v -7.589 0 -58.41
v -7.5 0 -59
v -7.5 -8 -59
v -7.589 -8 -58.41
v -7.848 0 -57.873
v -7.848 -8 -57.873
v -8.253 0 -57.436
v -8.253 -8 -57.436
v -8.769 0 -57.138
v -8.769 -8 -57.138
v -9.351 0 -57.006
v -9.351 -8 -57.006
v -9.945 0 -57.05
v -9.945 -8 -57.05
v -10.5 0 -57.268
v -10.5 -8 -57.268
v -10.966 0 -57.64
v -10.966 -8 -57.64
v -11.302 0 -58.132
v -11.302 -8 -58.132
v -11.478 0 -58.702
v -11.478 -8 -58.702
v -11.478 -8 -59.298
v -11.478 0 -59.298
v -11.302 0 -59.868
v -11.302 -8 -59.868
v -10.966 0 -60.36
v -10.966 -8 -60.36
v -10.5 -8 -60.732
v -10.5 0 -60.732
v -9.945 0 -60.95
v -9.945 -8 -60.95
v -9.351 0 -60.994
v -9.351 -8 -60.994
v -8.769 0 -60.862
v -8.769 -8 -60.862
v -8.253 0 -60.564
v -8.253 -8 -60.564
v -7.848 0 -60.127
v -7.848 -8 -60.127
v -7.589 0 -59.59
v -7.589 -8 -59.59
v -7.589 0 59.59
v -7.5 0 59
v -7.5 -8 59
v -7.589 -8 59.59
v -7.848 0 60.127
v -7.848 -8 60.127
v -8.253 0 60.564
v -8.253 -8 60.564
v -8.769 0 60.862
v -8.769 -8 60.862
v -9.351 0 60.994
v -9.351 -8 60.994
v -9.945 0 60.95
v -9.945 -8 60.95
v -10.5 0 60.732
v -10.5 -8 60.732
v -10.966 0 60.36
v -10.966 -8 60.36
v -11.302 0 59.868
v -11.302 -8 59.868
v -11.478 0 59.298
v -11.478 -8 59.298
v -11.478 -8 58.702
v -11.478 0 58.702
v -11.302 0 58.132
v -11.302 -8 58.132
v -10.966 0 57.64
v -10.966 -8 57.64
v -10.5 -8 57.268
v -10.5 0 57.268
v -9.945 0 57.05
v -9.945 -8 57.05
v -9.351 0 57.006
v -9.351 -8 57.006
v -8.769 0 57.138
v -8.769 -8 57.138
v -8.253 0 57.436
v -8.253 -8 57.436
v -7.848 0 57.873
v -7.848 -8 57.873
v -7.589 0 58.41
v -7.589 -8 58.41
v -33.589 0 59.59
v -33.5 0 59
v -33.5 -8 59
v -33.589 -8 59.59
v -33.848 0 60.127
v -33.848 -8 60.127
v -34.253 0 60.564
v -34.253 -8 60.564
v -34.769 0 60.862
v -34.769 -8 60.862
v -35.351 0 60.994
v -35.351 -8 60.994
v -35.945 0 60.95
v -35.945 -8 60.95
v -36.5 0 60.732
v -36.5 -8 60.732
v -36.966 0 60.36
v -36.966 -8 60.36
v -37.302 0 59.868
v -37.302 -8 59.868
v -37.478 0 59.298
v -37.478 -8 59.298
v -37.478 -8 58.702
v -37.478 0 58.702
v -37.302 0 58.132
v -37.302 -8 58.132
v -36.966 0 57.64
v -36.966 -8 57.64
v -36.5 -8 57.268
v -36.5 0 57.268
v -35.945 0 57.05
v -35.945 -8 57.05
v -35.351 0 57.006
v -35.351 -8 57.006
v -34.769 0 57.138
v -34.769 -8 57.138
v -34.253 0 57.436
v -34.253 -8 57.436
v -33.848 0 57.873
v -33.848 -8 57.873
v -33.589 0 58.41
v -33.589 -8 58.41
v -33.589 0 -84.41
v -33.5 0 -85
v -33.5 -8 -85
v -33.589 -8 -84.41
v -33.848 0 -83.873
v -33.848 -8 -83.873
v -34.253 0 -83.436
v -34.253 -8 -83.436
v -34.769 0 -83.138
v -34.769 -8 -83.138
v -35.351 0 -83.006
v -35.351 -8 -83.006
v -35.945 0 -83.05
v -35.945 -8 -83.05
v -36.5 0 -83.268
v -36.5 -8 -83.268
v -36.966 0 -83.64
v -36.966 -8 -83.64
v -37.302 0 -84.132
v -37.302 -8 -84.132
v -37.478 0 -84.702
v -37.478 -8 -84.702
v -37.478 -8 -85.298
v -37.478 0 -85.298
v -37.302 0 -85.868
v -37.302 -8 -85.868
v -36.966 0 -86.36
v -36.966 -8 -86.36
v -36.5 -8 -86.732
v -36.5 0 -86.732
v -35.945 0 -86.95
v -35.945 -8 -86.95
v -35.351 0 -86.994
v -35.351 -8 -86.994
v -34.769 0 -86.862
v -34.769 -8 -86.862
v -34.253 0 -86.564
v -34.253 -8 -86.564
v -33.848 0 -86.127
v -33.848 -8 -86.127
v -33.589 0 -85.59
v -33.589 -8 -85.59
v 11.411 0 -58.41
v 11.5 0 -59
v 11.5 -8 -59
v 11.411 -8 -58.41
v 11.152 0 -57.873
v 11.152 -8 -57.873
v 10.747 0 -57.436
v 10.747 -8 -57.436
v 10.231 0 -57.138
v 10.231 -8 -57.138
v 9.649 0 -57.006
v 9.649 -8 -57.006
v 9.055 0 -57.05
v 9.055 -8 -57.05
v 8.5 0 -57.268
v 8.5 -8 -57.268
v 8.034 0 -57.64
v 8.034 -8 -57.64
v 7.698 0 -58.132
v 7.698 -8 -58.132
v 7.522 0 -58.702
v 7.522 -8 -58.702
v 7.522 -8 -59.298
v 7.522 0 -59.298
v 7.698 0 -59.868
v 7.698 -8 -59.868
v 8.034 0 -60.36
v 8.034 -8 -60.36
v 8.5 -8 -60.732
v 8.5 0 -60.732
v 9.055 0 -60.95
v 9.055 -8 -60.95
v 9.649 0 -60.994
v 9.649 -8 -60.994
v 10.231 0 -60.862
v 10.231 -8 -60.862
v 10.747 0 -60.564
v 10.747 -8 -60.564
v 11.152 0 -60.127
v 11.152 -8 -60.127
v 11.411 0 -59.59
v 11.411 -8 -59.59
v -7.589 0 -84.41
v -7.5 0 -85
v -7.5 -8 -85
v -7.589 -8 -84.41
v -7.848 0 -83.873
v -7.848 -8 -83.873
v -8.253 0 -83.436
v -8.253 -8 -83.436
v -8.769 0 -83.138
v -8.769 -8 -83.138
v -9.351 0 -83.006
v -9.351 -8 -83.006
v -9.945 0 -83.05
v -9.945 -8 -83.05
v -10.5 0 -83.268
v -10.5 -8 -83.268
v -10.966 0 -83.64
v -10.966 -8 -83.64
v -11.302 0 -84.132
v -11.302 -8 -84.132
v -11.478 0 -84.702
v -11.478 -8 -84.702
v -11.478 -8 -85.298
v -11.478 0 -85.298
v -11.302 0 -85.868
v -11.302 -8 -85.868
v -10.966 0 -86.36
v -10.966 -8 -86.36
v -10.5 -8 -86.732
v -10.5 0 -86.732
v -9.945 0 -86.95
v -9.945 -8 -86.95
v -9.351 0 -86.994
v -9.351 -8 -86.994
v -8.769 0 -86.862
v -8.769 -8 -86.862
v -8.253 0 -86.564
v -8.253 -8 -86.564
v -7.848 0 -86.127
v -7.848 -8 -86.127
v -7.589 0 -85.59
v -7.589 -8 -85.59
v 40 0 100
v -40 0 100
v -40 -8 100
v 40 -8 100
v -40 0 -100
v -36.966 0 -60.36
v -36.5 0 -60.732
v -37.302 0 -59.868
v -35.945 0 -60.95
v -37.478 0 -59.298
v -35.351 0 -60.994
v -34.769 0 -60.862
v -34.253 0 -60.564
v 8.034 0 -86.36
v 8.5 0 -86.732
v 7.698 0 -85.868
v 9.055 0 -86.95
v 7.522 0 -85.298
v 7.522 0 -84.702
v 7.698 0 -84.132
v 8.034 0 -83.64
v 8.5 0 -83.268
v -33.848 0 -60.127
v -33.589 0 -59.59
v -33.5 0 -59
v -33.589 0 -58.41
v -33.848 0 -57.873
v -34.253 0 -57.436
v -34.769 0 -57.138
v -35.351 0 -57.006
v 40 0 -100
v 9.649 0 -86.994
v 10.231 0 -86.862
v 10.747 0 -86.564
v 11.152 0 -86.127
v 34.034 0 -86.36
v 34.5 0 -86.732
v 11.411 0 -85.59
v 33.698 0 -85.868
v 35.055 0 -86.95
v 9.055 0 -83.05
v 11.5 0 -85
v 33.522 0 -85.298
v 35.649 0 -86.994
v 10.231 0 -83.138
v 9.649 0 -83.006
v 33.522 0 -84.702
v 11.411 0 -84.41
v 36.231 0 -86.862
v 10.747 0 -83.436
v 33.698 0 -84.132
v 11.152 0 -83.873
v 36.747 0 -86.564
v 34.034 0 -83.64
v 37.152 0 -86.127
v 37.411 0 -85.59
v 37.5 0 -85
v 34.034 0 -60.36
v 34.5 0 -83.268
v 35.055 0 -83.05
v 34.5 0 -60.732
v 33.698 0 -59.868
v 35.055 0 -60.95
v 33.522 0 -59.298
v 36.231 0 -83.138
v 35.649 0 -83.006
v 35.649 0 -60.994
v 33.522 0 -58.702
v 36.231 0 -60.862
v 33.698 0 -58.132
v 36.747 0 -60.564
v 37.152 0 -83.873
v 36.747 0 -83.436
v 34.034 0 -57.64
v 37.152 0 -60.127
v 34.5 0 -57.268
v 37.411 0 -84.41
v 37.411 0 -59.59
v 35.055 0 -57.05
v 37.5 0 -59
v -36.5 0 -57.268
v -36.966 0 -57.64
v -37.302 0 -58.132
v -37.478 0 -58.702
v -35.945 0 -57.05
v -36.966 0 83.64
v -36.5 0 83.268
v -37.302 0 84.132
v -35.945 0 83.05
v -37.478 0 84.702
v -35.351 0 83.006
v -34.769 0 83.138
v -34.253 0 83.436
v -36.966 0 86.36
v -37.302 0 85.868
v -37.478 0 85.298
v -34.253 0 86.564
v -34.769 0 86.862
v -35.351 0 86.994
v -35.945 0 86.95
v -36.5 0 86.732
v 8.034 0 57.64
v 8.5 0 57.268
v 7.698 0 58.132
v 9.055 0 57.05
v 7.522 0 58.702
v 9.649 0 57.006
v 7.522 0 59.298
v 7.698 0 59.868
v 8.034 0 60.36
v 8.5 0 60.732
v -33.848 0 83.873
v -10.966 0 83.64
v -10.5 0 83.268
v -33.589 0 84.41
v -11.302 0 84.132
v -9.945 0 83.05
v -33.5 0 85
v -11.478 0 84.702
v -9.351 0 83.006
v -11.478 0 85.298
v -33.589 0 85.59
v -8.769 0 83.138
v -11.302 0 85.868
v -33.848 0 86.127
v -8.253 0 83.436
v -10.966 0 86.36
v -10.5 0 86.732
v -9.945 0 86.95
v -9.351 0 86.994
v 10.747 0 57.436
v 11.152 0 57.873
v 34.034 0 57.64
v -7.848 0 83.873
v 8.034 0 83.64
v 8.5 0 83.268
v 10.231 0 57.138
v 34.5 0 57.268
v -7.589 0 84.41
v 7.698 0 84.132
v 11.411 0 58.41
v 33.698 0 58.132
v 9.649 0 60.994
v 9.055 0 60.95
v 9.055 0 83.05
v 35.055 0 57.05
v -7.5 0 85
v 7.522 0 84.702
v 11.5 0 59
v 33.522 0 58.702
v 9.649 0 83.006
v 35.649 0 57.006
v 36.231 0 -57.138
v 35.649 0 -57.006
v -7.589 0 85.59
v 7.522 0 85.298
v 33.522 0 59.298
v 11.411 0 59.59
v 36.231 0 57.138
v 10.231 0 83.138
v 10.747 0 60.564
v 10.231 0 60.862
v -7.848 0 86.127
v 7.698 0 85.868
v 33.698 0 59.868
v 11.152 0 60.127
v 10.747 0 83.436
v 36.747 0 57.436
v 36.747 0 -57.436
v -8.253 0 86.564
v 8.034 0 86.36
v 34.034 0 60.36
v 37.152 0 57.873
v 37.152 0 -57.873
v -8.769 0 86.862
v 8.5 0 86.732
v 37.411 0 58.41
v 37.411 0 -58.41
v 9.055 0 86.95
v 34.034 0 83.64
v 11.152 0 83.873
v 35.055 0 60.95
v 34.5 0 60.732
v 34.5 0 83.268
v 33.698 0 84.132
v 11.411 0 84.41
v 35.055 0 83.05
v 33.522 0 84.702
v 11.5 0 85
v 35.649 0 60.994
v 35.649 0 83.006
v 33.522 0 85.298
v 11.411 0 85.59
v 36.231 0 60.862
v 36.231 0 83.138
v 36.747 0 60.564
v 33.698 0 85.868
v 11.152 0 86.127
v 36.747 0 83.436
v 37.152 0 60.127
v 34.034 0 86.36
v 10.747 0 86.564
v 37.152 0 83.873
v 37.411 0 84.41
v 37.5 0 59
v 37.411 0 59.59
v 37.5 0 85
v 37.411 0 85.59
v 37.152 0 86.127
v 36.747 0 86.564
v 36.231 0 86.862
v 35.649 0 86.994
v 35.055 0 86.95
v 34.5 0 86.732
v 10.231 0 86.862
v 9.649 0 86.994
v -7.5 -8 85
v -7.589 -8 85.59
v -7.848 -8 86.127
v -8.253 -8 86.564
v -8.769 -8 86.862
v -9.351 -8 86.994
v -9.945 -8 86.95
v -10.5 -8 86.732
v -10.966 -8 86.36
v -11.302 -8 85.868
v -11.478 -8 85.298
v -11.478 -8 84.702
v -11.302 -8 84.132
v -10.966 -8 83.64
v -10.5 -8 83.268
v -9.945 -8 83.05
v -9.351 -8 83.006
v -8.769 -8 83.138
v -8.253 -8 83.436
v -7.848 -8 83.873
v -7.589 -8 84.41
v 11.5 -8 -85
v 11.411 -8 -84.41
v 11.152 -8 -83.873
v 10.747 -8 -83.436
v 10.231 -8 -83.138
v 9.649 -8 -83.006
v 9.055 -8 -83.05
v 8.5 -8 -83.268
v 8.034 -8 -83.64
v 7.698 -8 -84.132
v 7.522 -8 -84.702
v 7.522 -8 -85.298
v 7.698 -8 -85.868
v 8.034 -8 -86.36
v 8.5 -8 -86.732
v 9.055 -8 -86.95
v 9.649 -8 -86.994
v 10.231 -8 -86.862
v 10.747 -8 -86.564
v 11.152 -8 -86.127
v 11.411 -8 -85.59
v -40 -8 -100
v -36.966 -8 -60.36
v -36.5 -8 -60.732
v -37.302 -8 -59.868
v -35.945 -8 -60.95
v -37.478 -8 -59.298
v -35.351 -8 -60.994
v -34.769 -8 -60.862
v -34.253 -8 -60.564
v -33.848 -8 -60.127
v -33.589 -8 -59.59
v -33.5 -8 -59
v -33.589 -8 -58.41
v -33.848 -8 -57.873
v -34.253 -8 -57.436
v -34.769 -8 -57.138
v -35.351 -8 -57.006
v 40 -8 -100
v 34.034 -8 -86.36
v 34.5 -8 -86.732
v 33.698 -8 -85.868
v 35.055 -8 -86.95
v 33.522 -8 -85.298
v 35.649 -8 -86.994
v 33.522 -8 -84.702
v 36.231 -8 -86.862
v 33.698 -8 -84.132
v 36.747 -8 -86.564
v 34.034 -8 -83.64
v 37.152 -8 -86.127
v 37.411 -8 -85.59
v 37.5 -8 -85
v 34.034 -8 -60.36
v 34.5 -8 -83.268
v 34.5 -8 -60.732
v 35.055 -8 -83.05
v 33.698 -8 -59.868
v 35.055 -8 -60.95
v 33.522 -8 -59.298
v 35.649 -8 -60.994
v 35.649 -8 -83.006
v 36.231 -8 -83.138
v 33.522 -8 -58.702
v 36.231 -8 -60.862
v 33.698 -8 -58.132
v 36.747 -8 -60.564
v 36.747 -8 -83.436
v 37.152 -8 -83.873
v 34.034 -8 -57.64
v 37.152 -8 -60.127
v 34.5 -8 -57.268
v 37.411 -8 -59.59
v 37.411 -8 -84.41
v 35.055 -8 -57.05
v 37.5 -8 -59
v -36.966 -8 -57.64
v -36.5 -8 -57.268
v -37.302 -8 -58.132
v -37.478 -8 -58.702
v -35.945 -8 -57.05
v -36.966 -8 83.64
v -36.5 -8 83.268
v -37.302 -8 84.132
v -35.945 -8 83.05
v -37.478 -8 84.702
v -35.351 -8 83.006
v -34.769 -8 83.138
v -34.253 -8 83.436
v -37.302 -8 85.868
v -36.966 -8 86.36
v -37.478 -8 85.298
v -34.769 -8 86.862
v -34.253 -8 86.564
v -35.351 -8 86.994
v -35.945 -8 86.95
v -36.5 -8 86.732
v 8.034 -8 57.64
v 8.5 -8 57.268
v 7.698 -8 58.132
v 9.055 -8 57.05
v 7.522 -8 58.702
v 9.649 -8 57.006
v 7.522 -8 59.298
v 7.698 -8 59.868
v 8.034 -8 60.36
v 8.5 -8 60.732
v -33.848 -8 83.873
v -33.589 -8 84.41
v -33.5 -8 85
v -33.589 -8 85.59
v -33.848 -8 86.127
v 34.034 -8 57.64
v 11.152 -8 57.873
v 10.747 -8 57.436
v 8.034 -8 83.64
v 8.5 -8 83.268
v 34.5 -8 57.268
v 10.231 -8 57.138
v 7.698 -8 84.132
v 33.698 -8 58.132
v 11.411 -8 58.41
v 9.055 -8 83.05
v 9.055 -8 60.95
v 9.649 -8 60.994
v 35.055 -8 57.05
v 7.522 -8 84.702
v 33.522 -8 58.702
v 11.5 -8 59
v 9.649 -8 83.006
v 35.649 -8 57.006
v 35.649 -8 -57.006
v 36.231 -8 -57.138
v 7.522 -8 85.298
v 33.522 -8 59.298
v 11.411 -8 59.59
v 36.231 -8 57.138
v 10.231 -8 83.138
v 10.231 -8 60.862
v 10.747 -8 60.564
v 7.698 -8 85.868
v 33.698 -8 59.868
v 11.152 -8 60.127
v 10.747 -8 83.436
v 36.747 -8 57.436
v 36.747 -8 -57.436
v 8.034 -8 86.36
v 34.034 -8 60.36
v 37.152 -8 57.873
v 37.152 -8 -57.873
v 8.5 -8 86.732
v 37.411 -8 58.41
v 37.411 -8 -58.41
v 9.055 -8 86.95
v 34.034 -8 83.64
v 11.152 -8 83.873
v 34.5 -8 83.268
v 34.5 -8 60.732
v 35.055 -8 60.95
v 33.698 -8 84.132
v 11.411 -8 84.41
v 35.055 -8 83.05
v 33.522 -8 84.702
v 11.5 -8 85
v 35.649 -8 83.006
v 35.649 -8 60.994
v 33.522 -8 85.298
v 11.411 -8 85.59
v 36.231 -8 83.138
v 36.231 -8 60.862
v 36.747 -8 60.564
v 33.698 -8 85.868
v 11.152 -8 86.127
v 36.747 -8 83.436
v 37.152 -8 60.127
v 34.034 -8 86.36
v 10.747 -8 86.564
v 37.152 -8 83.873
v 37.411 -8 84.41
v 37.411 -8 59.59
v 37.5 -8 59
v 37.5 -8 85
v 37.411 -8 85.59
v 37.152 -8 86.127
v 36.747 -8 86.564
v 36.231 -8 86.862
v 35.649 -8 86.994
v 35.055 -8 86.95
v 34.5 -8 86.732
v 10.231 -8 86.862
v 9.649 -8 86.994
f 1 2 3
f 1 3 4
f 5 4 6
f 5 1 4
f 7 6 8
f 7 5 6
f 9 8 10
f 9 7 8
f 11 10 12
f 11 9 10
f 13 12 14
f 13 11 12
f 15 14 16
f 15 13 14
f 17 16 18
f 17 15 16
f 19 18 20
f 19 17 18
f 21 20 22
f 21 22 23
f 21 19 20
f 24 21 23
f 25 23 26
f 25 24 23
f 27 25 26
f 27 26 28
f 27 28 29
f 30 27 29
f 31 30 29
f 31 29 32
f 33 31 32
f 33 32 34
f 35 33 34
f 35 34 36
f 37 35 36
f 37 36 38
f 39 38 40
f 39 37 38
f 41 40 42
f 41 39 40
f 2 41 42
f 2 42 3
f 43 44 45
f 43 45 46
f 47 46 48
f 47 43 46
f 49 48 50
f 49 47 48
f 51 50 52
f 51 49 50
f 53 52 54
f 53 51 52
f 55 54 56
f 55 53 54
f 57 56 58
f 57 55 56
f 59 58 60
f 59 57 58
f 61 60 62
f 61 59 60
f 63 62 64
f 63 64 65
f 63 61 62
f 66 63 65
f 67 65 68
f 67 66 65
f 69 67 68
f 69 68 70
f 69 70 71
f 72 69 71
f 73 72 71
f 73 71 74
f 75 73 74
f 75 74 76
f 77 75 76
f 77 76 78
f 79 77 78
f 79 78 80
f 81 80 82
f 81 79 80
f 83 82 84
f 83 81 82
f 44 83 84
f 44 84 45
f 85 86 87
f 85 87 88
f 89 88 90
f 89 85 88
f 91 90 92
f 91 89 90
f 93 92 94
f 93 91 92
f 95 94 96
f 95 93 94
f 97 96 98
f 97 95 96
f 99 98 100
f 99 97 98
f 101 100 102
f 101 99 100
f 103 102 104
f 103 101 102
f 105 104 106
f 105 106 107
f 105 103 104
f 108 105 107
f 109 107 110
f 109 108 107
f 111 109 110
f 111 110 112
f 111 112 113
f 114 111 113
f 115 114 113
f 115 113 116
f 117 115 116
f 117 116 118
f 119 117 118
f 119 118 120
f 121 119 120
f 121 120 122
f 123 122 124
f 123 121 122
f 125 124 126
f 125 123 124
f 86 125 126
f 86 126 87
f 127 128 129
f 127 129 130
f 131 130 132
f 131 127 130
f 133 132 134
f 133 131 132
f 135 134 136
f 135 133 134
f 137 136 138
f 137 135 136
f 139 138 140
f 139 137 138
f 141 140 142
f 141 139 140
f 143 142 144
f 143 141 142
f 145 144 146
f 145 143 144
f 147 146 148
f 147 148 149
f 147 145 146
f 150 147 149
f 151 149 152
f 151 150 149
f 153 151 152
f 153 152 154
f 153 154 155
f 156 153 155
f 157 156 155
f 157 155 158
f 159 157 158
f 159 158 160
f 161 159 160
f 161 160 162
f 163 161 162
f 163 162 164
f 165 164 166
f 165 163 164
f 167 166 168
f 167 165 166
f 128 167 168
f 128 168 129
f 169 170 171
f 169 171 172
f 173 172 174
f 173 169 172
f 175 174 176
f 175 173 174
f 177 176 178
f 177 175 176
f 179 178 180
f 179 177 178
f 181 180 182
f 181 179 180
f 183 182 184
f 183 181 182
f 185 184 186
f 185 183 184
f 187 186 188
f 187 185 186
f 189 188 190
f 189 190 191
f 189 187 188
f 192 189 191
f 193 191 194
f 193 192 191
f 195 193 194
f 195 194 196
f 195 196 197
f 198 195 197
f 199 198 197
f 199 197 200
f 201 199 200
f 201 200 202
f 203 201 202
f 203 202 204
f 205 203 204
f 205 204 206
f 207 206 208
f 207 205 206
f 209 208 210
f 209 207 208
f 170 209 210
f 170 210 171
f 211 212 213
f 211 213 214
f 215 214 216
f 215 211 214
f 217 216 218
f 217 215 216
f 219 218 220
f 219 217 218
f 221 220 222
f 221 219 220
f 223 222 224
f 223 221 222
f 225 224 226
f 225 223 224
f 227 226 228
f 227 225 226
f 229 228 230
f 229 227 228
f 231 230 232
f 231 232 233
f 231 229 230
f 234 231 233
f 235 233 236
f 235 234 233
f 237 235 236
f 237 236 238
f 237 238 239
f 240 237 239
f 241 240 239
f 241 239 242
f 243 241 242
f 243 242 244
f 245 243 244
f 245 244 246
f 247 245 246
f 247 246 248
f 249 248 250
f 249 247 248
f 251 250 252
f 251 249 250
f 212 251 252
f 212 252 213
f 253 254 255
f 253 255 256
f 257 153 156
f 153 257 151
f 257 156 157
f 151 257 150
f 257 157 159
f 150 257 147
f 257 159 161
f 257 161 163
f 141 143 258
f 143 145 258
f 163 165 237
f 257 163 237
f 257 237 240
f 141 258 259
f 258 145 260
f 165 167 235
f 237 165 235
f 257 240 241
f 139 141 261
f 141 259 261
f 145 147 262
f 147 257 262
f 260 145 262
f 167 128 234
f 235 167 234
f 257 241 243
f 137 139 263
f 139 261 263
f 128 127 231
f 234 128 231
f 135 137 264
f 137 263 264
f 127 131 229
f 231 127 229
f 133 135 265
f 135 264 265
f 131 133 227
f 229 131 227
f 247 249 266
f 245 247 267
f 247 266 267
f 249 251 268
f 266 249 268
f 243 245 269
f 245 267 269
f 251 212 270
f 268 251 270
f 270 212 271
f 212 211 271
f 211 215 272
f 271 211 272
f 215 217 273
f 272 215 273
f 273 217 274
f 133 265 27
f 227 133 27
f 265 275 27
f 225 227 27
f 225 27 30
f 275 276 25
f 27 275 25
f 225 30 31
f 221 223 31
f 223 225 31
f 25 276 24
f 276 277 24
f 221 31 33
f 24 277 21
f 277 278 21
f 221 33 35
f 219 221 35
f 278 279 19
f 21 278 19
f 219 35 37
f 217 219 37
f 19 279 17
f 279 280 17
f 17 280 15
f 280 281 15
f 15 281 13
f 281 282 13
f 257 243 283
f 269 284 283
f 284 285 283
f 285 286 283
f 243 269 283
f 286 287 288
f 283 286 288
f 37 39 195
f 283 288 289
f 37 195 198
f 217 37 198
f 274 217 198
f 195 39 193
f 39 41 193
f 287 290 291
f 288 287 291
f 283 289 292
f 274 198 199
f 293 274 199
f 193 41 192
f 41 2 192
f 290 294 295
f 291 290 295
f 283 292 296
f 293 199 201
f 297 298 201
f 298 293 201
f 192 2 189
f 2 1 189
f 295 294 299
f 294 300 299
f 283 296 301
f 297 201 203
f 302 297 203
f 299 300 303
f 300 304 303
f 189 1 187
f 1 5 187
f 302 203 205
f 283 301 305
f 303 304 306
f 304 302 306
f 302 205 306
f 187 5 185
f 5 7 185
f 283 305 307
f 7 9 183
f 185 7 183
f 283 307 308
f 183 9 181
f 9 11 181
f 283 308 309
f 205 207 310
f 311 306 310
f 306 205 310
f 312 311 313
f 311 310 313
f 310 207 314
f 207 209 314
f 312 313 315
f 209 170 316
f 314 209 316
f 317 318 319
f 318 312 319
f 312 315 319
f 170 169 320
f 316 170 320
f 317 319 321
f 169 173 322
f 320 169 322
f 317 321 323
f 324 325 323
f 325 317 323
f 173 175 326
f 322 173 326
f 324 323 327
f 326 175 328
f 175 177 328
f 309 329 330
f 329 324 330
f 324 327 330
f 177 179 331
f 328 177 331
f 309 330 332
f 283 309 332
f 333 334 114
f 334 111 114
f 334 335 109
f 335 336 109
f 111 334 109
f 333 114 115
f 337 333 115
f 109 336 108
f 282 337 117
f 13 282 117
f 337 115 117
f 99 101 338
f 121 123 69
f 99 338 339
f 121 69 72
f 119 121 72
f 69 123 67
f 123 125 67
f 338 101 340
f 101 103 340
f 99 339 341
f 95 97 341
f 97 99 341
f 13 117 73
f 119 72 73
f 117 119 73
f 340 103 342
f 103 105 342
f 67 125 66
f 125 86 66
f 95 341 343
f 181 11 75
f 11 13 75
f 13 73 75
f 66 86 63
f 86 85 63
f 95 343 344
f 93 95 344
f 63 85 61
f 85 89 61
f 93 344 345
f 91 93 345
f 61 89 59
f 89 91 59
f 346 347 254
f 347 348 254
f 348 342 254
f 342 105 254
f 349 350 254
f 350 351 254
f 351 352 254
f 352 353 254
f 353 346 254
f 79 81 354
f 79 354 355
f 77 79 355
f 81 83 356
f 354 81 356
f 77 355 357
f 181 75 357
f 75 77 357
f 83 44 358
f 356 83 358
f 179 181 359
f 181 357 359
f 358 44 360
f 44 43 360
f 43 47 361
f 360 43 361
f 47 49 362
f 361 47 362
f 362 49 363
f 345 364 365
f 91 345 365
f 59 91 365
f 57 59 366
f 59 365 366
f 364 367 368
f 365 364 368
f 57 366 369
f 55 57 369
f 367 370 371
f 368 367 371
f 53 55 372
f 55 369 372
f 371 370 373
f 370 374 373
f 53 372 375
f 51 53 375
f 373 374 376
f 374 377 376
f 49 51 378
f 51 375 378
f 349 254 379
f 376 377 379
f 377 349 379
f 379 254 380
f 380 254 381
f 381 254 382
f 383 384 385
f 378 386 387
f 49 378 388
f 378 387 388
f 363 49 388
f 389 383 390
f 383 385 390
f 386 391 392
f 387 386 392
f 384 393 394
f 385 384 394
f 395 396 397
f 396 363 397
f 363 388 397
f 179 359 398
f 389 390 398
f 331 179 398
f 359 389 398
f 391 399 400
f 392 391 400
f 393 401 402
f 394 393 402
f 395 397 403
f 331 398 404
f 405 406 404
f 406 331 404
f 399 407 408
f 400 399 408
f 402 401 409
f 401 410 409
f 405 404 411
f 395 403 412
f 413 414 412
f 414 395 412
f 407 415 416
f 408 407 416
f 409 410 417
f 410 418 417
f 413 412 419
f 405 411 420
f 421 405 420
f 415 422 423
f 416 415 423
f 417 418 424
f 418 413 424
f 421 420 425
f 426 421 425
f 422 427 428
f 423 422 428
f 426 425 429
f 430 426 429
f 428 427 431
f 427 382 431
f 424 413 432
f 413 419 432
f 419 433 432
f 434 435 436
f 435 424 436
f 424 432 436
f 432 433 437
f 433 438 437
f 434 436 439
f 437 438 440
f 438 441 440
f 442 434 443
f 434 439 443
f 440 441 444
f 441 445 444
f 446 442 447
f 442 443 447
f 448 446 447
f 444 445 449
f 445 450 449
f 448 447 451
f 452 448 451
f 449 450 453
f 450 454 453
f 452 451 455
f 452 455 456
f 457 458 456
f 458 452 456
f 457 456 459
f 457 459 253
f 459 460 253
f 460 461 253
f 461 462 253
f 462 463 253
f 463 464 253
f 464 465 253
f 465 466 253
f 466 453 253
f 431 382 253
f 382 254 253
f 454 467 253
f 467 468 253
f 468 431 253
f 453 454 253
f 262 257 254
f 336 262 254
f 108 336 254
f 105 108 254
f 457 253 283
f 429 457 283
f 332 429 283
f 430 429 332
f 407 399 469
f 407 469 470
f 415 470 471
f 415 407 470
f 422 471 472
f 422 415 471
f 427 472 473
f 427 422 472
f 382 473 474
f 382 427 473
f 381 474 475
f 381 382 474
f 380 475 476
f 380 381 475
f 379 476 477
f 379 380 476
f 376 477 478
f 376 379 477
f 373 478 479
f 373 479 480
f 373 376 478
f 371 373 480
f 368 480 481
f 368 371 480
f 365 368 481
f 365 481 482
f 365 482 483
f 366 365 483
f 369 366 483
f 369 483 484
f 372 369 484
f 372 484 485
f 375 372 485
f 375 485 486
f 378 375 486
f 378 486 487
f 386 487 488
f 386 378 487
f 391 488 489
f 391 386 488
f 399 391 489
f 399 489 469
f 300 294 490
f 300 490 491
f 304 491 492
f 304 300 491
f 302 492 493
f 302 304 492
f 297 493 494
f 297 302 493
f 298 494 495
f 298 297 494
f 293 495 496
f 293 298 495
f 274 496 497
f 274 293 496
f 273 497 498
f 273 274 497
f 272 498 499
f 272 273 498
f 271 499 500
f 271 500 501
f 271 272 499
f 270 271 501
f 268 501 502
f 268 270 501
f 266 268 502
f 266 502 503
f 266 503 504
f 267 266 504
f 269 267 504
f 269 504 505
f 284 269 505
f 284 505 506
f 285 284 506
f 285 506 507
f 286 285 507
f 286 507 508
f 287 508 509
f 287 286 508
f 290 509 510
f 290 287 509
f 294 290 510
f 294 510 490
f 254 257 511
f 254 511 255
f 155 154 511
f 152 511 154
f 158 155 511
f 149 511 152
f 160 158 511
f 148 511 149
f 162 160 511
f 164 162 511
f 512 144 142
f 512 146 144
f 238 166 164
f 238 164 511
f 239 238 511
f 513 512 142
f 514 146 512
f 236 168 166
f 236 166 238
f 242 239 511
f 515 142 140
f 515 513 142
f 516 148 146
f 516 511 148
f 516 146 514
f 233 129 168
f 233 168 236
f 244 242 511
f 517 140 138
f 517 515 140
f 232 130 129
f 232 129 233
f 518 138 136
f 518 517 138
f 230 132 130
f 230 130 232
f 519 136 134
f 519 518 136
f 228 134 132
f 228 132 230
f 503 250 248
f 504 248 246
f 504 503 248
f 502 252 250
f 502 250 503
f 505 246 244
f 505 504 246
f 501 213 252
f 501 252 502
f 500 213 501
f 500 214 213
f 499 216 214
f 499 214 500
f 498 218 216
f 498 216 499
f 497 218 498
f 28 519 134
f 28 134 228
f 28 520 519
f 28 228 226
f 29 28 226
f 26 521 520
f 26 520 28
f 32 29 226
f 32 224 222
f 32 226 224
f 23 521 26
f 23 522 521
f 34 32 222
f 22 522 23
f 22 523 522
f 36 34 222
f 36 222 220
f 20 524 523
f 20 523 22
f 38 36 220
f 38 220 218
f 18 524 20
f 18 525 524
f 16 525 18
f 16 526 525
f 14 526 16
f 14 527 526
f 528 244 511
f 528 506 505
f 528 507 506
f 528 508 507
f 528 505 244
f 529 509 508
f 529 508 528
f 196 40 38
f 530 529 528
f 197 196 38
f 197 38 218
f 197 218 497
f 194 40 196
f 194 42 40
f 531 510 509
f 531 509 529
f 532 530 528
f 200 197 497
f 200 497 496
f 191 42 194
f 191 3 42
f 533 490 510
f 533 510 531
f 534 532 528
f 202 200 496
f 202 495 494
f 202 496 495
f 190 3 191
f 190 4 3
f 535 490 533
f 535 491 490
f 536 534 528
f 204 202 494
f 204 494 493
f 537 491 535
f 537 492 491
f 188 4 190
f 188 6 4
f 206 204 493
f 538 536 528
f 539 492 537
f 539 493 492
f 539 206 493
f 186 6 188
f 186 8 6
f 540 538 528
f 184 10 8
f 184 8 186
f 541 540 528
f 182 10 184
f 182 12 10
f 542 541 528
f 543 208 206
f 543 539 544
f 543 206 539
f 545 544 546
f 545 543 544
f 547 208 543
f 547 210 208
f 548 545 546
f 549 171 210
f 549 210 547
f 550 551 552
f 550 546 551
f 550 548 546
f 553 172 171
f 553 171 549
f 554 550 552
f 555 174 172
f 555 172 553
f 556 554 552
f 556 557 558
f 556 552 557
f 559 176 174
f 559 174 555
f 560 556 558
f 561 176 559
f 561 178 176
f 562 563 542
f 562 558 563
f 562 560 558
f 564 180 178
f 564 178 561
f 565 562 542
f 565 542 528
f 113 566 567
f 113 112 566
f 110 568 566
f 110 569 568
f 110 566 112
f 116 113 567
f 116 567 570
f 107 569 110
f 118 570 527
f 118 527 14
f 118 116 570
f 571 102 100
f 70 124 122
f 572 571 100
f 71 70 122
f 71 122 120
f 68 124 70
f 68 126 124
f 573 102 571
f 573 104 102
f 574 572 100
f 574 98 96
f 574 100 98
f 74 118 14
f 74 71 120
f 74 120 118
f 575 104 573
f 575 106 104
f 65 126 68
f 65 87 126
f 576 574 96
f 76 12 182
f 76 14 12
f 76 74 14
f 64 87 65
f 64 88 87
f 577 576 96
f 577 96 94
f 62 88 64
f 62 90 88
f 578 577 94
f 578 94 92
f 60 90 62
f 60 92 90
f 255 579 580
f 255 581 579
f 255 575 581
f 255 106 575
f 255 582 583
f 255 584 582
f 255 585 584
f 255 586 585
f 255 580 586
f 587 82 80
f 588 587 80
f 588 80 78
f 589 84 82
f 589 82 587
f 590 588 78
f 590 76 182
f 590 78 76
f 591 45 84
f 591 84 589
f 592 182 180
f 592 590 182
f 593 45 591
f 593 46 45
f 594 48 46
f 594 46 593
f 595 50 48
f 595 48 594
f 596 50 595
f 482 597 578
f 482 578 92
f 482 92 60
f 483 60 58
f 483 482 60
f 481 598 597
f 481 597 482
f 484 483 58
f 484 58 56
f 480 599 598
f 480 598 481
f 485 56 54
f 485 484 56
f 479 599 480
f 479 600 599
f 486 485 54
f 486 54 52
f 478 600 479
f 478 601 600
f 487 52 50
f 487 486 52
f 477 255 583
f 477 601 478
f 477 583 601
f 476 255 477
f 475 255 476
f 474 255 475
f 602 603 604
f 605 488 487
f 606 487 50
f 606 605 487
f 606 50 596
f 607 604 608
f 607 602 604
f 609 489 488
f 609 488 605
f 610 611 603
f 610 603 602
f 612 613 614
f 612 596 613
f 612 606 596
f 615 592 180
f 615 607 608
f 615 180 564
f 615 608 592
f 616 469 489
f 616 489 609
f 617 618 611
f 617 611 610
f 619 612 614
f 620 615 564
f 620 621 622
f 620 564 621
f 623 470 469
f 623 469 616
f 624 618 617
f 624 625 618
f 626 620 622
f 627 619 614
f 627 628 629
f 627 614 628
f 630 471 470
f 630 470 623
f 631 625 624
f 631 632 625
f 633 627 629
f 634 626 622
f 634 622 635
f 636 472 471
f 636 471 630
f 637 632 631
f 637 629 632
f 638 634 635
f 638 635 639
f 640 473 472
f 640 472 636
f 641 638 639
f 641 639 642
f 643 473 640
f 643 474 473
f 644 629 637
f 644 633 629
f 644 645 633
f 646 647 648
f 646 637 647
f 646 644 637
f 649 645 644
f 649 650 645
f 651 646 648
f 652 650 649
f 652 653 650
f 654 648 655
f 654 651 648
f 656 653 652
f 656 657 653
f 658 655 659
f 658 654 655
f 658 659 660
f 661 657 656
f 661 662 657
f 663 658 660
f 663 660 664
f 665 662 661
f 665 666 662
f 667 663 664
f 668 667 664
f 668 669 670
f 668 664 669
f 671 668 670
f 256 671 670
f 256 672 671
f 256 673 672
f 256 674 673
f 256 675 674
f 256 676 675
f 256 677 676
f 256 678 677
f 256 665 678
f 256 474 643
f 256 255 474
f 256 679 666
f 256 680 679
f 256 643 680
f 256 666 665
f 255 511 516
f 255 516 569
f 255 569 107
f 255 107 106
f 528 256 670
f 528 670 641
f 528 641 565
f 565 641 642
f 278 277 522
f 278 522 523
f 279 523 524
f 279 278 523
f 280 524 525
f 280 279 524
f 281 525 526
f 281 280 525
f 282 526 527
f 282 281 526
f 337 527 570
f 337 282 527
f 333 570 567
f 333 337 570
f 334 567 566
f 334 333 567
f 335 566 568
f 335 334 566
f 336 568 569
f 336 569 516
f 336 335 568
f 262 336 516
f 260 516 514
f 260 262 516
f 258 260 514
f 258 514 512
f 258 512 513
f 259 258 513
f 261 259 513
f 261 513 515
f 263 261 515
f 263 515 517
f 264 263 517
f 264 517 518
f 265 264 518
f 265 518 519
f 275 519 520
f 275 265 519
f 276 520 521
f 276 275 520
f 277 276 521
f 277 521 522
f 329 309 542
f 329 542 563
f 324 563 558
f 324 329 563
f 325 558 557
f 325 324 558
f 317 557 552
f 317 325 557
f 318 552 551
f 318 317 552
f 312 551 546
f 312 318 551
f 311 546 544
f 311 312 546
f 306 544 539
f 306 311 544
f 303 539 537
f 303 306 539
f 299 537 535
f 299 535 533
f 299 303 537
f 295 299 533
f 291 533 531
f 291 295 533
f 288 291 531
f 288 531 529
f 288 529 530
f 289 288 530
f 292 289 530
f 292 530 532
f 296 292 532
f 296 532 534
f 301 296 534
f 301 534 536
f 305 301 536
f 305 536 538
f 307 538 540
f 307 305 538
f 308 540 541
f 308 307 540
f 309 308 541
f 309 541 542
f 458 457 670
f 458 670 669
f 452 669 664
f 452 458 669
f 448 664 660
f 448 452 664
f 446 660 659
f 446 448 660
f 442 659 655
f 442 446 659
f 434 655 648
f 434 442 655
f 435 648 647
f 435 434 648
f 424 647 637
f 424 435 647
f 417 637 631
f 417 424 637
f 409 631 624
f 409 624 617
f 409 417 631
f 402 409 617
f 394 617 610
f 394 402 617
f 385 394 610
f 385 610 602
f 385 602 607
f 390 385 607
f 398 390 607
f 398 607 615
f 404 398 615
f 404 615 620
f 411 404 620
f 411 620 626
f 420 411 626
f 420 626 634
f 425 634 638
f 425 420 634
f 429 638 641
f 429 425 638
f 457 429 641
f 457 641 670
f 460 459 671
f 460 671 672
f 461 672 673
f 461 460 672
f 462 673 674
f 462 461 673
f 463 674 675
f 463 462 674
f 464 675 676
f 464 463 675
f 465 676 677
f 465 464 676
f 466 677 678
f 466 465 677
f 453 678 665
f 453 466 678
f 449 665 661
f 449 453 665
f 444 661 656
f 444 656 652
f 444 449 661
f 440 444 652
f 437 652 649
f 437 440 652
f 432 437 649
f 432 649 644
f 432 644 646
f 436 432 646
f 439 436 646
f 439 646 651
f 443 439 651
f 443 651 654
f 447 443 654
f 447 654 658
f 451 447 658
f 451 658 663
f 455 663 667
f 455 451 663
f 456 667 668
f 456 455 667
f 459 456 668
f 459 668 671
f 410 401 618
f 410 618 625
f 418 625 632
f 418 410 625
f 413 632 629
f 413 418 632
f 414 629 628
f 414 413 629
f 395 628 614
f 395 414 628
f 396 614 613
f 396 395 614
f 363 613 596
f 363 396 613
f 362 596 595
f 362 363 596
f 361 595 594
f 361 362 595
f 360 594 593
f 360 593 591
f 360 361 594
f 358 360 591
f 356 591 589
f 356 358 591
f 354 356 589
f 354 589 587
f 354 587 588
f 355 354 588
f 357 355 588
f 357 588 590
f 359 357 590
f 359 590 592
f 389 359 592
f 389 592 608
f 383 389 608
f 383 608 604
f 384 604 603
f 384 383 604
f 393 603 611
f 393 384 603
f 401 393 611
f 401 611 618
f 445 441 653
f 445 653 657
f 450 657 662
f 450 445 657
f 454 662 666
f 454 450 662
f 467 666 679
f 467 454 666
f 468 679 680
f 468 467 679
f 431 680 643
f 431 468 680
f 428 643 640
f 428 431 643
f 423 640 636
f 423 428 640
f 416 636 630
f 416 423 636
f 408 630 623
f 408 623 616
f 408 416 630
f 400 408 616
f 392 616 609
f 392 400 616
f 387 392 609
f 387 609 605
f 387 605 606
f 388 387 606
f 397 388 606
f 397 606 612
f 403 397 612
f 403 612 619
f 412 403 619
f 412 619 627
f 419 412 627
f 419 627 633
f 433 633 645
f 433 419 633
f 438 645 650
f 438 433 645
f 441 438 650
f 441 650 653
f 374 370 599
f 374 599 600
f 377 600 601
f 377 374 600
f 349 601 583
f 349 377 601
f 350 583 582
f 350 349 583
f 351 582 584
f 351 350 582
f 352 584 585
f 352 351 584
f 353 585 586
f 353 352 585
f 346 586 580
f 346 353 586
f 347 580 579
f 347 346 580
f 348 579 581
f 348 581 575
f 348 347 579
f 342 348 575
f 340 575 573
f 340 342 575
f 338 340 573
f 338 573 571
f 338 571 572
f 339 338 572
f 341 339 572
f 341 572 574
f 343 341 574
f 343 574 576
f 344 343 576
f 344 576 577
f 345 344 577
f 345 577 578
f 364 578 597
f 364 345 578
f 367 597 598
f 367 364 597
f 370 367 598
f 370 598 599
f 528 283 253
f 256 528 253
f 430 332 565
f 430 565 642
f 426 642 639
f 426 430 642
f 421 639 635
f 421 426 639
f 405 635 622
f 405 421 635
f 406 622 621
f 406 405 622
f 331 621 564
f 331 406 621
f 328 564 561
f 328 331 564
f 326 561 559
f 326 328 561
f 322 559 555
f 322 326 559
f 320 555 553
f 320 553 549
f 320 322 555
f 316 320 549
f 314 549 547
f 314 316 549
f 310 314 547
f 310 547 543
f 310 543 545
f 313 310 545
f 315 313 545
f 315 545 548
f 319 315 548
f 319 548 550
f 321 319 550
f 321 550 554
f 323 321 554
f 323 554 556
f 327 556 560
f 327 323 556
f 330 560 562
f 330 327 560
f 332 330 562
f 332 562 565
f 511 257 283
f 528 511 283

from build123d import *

# Parameters (mm, degrees)
F0_W     = 80
F0_H     = 200
F0_R     = 2
F1_DEPTH = 8


with BuildPart() as f1:
    # F0 (on Front) → F1 (new body)
    with BuildSketch(Plane.XZ):
        Rectangle(F0_W, F0_H)
        with Locations((-35.5, -85)):
            Circle(F0_R, mode=Mode.SUBTRACT)
        with Locations((-35.5, -59)):
            Circle(F0_R, mode=Mode.SUBTRACT)
        with Locations((-9.5, -85)):
            Circle(F0_R, mode=Mode.SUBTRACT)
        with Locations((-9.5, -59)):
            Circle(F0_R, mode=Mode.SUBTRACT)
        with Locations((9.5, -85)):
            Circle(F0_R, mode=Mode.SUBTRACT)
        with Locations((9.5, -59)):
            Circle(F0_R, mode=Mode.SUBTRACT)
        with Locations((35.5, -85)):
            Circle(F0_R, mode=Mode.SUBTRACT)
        with Locations((35.5, -59)):
            Circle(F0_R, mode=Mode.SUBTRACT)
        with Locations((-35.5, 59)):
            Circle(F0_R, mode=Mode.SUBTRACT)
        with Locations((-35.5, 85)):
            Circle(F0_R, mode=Mode.SUBTRACT)
        with Locations((-9.5, 59)):
            Circle(F0_R, mode=Mode.SUBTRACT)
        with Locations((-9.5, 85)):
            Circle(F0_R, mode=Mode.SUBTRACT)
        with Locations((9.5, 59)):
            Circle(F0_R, mode=Mode.SUBTRACT)
        with Locations((9.5, 85)):
            Circle(F0_R, mode=Mode.SUBTRACT)
        with Locations((35.5, 59)):
            Circle(F0_R, mode=Mode.SUBTRACT)
        with Locations((35.5, 85)):
            Circle(F0_R, mode=Mode.SUBTRACT)
    extrude(amount=F1_DEPTH)


solid = f1.part
